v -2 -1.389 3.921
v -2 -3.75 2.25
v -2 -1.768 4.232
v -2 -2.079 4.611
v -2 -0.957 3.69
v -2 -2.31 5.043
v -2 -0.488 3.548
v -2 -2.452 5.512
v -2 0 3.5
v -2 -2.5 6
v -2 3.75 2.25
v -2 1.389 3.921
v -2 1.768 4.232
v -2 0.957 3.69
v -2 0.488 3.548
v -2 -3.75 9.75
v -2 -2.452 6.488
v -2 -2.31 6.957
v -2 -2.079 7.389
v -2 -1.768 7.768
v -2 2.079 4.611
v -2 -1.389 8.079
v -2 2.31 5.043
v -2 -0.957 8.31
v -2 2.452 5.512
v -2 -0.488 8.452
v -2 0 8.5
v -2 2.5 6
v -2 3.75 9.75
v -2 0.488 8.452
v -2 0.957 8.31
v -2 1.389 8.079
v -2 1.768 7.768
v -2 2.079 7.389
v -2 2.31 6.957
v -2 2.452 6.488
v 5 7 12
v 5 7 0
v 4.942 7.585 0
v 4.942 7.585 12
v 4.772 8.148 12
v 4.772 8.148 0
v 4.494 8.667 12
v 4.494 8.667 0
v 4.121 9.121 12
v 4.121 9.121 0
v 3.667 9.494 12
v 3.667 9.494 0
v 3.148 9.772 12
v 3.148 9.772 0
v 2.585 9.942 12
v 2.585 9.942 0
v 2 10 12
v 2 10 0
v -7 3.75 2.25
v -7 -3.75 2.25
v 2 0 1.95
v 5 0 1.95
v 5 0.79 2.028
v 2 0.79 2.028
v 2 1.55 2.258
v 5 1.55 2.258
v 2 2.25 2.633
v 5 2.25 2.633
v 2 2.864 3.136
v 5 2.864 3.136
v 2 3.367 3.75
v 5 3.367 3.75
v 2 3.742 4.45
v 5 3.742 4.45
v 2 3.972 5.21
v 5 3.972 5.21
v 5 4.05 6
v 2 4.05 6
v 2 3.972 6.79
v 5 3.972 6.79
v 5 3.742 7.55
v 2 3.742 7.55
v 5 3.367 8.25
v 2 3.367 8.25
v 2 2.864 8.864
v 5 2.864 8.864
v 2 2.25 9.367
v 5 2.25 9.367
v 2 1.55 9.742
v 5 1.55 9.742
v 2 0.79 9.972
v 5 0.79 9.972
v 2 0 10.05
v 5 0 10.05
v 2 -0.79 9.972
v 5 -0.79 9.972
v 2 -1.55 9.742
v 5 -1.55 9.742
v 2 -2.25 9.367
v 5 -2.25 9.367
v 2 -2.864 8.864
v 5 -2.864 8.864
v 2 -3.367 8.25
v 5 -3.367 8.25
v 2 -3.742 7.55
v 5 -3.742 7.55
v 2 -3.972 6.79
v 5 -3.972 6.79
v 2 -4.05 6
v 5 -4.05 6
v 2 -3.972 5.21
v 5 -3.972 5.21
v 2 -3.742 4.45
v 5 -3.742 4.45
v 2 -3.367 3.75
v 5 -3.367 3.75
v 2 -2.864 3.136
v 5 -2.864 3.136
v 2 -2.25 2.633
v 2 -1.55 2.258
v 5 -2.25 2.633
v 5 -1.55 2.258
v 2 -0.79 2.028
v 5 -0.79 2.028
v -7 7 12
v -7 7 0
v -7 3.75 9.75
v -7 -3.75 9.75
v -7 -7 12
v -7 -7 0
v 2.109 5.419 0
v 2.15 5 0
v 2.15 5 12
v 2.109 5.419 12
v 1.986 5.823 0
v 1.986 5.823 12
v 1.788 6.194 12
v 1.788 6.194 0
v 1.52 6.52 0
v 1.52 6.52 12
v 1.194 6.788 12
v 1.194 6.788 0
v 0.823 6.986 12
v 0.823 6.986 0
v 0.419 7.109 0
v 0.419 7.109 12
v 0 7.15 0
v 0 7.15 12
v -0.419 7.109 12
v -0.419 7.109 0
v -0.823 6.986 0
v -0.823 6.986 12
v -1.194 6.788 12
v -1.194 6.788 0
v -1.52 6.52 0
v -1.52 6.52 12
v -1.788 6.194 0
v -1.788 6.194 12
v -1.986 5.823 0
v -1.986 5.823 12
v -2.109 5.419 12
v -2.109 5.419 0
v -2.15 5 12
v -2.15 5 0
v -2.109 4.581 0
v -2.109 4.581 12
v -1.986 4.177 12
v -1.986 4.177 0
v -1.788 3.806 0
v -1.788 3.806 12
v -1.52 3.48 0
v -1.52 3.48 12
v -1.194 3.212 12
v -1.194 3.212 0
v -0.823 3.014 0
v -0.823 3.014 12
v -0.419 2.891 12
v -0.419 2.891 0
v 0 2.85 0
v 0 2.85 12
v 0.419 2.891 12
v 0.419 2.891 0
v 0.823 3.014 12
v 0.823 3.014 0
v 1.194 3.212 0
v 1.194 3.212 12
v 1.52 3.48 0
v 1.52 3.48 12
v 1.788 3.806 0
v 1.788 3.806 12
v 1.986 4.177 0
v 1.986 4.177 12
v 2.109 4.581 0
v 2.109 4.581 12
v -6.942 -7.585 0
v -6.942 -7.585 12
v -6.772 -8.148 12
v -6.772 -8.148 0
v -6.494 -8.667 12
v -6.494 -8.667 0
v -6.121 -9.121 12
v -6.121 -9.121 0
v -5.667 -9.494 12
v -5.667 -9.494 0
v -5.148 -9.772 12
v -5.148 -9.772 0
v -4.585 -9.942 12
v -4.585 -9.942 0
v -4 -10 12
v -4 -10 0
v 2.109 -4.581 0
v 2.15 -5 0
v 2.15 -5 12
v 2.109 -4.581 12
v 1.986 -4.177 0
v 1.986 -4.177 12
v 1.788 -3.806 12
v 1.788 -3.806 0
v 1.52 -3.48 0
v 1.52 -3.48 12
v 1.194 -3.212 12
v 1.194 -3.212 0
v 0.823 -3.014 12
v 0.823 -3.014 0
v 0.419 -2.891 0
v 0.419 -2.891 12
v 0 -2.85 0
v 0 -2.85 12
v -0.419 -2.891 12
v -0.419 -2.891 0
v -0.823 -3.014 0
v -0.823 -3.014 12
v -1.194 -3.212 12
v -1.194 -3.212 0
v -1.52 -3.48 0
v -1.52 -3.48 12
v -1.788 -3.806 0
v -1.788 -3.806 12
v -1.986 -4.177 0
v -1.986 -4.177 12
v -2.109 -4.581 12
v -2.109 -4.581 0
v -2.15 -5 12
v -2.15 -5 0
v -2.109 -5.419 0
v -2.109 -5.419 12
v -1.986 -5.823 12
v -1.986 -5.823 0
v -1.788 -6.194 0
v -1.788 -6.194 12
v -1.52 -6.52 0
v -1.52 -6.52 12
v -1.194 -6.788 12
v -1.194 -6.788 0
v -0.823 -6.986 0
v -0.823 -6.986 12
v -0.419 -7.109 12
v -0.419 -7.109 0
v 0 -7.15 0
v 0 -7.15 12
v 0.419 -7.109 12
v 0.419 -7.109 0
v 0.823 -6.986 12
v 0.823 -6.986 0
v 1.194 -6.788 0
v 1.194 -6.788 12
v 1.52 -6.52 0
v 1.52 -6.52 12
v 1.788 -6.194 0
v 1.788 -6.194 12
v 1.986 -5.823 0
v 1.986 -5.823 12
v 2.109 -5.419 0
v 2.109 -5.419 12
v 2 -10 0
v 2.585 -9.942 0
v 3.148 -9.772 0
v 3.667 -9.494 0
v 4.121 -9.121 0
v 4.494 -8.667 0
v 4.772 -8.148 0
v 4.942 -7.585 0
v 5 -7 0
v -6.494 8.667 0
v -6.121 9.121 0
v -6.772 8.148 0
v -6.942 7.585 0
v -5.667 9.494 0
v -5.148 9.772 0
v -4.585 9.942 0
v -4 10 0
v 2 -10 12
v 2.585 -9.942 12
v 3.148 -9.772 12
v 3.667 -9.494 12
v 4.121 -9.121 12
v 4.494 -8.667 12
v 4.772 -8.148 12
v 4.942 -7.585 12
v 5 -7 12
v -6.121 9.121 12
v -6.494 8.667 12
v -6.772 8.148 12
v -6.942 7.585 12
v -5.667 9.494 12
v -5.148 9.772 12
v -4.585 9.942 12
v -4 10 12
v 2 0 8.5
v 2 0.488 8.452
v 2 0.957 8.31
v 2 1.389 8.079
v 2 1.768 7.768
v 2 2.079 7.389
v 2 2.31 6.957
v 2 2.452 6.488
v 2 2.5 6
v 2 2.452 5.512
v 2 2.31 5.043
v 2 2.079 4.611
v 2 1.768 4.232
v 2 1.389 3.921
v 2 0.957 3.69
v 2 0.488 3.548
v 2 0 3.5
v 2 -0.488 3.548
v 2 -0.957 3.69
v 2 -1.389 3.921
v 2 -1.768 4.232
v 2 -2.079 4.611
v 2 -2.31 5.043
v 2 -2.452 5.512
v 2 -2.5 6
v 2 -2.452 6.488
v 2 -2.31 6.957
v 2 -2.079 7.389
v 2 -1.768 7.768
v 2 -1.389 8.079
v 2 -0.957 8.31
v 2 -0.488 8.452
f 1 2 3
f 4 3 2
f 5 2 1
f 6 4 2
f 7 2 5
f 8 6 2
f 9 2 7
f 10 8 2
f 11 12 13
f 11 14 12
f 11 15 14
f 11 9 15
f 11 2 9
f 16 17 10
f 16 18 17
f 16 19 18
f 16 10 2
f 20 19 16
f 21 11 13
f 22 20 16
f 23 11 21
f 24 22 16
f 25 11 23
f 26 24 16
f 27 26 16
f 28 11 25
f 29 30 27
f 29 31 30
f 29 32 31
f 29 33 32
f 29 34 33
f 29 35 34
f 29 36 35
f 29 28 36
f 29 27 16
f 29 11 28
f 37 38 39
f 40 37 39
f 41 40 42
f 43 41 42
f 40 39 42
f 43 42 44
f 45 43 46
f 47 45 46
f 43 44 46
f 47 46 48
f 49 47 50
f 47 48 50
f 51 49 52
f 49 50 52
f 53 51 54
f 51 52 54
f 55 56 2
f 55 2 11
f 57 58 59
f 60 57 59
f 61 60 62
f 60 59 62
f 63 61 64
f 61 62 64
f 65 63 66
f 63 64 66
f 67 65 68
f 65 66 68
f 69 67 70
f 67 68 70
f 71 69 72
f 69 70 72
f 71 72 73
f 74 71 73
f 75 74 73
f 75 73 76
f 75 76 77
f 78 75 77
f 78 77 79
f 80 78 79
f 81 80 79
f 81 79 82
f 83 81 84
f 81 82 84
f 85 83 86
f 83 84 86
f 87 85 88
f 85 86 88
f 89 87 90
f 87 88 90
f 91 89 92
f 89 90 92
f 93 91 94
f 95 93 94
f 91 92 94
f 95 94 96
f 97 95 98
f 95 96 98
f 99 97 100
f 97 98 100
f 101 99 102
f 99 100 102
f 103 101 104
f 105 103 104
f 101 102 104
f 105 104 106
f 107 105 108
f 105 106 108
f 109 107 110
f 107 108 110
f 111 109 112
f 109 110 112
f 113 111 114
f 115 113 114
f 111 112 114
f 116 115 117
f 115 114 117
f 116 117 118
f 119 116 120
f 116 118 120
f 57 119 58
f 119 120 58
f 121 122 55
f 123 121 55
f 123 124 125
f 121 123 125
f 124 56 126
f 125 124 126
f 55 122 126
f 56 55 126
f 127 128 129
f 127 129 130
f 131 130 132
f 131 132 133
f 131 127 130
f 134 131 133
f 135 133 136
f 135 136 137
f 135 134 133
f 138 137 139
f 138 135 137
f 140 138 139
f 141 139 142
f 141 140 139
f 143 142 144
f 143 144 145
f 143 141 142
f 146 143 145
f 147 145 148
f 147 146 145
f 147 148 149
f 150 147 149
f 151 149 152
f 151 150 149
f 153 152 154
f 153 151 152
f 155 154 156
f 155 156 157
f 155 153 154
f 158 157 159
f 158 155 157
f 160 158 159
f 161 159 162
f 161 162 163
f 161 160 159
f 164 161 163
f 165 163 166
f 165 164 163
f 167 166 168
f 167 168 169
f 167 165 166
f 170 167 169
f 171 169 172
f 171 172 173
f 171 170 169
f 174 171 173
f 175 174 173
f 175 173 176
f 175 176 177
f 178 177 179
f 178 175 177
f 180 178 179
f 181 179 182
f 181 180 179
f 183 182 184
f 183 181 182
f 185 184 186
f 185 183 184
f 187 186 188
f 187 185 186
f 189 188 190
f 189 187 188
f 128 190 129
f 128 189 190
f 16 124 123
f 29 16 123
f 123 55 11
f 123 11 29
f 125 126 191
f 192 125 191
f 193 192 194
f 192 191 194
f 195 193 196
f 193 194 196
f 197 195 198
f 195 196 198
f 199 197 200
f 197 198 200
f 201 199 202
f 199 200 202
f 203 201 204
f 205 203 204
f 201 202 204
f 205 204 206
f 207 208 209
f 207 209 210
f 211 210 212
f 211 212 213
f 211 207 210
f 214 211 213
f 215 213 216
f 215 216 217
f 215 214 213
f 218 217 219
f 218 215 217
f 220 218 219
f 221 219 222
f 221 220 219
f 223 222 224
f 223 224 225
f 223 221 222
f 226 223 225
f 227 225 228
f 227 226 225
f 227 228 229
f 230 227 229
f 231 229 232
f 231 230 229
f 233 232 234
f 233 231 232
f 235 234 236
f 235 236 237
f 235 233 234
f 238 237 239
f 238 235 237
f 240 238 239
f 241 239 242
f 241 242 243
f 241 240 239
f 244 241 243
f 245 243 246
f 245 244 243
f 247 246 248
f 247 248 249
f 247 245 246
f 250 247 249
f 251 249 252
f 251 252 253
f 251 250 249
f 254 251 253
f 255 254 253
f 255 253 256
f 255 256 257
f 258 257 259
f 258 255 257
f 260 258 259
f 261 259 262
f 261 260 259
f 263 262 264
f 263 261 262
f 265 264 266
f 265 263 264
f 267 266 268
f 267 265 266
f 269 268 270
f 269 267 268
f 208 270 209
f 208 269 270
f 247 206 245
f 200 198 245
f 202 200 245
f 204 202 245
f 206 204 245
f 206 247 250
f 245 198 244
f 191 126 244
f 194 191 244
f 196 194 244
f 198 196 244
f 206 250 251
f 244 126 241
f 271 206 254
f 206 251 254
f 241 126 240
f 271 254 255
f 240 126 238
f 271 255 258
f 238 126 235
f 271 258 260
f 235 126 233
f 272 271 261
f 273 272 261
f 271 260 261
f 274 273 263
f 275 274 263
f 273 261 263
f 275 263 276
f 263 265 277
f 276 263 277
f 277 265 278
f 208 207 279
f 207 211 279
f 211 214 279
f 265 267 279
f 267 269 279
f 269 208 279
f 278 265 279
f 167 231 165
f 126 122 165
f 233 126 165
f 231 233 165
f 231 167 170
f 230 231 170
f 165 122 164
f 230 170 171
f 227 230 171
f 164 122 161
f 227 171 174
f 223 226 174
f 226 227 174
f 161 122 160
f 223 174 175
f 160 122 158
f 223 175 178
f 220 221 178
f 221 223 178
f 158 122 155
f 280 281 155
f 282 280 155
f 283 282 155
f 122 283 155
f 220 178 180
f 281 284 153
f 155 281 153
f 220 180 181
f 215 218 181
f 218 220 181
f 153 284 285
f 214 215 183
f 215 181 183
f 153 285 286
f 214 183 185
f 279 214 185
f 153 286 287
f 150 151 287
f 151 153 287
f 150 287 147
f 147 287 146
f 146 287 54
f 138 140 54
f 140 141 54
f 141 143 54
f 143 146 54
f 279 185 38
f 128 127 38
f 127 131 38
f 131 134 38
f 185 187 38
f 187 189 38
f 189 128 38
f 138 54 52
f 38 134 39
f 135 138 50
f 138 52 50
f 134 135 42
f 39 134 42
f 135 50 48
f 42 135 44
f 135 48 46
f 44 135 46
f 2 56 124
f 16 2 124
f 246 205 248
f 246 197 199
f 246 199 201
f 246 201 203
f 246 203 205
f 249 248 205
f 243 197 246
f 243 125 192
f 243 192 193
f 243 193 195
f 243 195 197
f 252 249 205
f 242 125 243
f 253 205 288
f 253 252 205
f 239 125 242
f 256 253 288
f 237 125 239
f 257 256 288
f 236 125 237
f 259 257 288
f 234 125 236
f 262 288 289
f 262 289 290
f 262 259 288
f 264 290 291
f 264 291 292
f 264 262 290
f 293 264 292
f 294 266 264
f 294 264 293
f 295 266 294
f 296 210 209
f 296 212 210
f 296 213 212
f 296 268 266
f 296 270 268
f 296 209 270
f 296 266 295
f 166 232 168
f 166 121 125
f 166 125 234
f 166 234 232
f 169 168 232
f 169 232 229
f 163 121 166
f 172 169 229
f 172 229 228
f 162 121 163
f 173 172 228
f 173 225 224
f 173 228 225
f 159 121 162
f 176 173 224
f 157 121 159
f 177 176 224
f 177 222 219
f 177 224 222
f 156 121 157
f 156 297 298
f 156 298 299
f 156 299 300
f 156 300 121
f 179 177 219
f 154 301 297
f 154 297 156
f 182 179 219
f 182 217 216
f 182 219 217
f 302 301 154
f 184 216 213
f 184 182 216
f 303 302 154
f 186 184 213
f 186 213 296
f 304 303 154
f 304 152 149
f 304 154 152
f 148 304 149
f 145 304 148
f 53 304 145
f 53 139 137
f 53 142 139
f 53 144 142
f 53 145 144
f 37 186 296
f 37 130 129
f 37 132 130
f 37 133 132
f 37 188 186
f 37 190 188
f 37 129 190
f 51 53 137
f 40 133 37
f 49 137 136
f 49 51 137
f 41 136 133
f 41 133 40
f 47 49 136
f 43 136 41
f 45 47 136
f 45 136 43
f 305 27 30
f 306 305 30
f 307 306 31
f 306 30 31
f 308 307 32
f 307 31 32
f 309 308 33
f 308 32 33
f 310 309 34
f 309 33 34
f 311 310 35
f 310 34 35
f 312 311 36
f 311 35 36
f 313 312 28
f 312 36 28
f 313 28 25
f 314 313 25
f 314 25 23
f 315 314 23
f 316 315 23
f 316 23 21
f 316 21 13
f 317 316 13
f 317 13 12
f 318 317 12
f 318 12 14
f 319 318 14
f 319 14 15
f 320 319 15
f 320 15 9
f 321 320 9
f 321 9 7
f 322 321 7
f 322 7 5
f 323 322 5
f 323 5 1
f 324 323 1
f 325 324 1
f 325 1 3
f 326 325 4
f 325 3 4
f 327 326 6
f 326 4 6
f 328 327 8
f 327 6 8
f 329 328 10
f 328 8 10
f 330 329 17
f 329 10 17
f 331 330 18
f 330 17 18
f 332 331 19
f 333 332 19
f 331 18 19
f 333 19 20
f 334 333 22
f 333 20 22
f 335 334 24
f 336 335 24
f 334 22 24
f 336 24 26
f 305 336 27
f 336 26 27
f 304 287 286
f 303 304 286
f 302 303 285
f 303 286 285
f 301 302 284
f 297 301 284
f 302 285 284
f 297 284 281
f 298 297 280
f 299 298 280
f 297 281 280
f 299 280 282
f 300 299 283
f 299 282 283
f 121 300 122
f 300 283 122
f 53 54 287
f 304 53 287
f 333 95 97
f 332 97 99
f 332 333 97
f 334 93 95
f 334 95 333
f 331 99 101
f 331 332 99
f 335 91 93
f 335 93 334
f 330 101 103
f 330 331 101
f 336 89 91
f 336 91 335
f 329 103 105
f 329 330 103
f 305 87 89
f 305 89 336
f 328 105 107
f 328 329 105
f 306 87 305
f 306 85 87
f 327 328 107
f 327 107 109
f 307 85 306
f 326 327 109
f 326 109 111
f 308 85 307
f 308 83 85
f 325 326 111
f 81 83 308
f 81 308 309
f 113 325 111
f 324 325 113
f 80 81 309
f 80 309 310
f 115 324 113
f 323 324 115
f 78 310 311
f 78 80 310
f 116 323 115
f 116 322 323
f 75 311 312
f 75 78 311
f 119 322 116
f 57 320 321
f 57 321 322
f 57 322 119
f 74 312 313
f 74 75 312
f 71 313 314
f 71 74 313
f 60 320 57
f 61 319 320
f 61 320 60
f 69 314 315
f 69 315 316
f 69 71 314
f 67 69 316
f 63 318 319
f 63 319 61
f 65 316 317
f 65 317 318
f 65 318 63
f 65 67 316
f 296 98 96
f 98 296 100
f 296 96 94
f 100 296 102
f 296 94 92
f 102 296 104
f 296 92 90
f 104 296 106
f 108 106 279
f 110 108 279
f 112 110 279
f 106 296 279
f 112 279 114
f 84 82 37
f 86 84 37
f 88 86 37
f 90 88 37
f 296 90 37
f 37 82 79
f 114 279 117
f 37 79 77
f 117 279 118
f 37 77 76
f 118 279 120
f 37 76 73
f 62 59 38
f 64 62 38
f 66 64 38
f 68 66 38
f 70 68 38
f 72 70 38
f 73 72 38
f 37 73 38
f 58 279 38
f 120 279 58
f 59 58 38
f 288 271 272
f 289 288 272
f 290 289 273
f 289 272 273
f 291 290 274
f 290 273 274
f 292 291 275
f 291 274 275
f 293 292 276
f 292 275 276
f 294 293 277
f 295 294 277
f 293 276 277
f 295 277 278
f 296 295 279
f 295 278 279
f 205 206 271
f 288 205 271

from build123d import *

# Parameters (mm, degrees)
SKETCH1_R           = 2.15
BOSS_EXTRUDE1_DEPTH = 12
SKETCH2_W           = 7.5
SKETCH2_H           = 7.5
SKETCH2_R           = 2.5
CUT_EXTRUDE1_DEPTH  = 5
SKETCH2_2_R         = 2.5
CUT_EXTRUDE2_DEPTH  = 13
SKETCH3_R           = 4.05
CUT_EXTRUDE3_DEPTH  = 3


with BuildPart() as part:
    # Sketch1 → Boss-Extrude1 (new body)
    with BuildSketch(Plane.XY):
        with BuildLine():
            Line((-4, -10), (2, -10))
            ThreePointArc((2, -10), (4.121320344, -9.121320344), (5, -7))
            Line((5, -7), (5, 7))
            ThreePointArc((5, 7), (4.121320344, 9.121320344), (2, 10))
            Line((2, 10), (-4, 10))
            ThreePointArc((-4, 10), (-6.121320344, 9.121320344), (-7, 7))
            Line((-7, 7), (-7, -7))
            ThreePointArc((-7, -7), (-6.121320344, -9.121320344), (-4, -10))
        make_face()
        with Locations((0, 5)):
            Circle(SKETCH1_R, mode=Mode.SUBTRACT)
        with Locations((0, -5)):
            Circle(SKETCH1_R, mode=Mode.SUBTRACT)
    extrude(amount=BOSS_EXTRUDE1_DEPTH)

    # Sketch2 → Cut-Extrude1 (cut)
    with BuildSketch(Plane.ZY.offset(7)):
        with Locations((6, 0)):
            Rectangle(SKETCH2_W, SKETCH2_H)
        with Locations((6, 0)):
            Circle(SKETCH2_R, mode=Mode.SUBTRACT)
    extrude(amount=-CUT_EXTRUDE1_DEPTH, mode=Mode.SUBTRACT)

    # Sketch2<2> → Cut-Extrude2 (cut, through all)
    with BuildSketch(Plane.ZY.offset(7)):
        with Locations((6, 0)):
            Circle(SKETCH2_2_R)
    extrude(amount=-CUT_EXTRUDE2_DEPTH, mode=Mode.SUBTRACT)

    # Sketch3 → Cut-Extrude3 (cut)
    with BuildSketch(Plane(origin=(5, 0, 0), x_dir=(0, 0, -1), z_dir=(1, 0, 0))):
        with Locations((-6, 0)):
            Circle(SKETCH3_R)
    extrude(amount=-CUT_EXTRUDE3_DEPTH, mode=Mode.SUBTRACT)


solid = part.part
